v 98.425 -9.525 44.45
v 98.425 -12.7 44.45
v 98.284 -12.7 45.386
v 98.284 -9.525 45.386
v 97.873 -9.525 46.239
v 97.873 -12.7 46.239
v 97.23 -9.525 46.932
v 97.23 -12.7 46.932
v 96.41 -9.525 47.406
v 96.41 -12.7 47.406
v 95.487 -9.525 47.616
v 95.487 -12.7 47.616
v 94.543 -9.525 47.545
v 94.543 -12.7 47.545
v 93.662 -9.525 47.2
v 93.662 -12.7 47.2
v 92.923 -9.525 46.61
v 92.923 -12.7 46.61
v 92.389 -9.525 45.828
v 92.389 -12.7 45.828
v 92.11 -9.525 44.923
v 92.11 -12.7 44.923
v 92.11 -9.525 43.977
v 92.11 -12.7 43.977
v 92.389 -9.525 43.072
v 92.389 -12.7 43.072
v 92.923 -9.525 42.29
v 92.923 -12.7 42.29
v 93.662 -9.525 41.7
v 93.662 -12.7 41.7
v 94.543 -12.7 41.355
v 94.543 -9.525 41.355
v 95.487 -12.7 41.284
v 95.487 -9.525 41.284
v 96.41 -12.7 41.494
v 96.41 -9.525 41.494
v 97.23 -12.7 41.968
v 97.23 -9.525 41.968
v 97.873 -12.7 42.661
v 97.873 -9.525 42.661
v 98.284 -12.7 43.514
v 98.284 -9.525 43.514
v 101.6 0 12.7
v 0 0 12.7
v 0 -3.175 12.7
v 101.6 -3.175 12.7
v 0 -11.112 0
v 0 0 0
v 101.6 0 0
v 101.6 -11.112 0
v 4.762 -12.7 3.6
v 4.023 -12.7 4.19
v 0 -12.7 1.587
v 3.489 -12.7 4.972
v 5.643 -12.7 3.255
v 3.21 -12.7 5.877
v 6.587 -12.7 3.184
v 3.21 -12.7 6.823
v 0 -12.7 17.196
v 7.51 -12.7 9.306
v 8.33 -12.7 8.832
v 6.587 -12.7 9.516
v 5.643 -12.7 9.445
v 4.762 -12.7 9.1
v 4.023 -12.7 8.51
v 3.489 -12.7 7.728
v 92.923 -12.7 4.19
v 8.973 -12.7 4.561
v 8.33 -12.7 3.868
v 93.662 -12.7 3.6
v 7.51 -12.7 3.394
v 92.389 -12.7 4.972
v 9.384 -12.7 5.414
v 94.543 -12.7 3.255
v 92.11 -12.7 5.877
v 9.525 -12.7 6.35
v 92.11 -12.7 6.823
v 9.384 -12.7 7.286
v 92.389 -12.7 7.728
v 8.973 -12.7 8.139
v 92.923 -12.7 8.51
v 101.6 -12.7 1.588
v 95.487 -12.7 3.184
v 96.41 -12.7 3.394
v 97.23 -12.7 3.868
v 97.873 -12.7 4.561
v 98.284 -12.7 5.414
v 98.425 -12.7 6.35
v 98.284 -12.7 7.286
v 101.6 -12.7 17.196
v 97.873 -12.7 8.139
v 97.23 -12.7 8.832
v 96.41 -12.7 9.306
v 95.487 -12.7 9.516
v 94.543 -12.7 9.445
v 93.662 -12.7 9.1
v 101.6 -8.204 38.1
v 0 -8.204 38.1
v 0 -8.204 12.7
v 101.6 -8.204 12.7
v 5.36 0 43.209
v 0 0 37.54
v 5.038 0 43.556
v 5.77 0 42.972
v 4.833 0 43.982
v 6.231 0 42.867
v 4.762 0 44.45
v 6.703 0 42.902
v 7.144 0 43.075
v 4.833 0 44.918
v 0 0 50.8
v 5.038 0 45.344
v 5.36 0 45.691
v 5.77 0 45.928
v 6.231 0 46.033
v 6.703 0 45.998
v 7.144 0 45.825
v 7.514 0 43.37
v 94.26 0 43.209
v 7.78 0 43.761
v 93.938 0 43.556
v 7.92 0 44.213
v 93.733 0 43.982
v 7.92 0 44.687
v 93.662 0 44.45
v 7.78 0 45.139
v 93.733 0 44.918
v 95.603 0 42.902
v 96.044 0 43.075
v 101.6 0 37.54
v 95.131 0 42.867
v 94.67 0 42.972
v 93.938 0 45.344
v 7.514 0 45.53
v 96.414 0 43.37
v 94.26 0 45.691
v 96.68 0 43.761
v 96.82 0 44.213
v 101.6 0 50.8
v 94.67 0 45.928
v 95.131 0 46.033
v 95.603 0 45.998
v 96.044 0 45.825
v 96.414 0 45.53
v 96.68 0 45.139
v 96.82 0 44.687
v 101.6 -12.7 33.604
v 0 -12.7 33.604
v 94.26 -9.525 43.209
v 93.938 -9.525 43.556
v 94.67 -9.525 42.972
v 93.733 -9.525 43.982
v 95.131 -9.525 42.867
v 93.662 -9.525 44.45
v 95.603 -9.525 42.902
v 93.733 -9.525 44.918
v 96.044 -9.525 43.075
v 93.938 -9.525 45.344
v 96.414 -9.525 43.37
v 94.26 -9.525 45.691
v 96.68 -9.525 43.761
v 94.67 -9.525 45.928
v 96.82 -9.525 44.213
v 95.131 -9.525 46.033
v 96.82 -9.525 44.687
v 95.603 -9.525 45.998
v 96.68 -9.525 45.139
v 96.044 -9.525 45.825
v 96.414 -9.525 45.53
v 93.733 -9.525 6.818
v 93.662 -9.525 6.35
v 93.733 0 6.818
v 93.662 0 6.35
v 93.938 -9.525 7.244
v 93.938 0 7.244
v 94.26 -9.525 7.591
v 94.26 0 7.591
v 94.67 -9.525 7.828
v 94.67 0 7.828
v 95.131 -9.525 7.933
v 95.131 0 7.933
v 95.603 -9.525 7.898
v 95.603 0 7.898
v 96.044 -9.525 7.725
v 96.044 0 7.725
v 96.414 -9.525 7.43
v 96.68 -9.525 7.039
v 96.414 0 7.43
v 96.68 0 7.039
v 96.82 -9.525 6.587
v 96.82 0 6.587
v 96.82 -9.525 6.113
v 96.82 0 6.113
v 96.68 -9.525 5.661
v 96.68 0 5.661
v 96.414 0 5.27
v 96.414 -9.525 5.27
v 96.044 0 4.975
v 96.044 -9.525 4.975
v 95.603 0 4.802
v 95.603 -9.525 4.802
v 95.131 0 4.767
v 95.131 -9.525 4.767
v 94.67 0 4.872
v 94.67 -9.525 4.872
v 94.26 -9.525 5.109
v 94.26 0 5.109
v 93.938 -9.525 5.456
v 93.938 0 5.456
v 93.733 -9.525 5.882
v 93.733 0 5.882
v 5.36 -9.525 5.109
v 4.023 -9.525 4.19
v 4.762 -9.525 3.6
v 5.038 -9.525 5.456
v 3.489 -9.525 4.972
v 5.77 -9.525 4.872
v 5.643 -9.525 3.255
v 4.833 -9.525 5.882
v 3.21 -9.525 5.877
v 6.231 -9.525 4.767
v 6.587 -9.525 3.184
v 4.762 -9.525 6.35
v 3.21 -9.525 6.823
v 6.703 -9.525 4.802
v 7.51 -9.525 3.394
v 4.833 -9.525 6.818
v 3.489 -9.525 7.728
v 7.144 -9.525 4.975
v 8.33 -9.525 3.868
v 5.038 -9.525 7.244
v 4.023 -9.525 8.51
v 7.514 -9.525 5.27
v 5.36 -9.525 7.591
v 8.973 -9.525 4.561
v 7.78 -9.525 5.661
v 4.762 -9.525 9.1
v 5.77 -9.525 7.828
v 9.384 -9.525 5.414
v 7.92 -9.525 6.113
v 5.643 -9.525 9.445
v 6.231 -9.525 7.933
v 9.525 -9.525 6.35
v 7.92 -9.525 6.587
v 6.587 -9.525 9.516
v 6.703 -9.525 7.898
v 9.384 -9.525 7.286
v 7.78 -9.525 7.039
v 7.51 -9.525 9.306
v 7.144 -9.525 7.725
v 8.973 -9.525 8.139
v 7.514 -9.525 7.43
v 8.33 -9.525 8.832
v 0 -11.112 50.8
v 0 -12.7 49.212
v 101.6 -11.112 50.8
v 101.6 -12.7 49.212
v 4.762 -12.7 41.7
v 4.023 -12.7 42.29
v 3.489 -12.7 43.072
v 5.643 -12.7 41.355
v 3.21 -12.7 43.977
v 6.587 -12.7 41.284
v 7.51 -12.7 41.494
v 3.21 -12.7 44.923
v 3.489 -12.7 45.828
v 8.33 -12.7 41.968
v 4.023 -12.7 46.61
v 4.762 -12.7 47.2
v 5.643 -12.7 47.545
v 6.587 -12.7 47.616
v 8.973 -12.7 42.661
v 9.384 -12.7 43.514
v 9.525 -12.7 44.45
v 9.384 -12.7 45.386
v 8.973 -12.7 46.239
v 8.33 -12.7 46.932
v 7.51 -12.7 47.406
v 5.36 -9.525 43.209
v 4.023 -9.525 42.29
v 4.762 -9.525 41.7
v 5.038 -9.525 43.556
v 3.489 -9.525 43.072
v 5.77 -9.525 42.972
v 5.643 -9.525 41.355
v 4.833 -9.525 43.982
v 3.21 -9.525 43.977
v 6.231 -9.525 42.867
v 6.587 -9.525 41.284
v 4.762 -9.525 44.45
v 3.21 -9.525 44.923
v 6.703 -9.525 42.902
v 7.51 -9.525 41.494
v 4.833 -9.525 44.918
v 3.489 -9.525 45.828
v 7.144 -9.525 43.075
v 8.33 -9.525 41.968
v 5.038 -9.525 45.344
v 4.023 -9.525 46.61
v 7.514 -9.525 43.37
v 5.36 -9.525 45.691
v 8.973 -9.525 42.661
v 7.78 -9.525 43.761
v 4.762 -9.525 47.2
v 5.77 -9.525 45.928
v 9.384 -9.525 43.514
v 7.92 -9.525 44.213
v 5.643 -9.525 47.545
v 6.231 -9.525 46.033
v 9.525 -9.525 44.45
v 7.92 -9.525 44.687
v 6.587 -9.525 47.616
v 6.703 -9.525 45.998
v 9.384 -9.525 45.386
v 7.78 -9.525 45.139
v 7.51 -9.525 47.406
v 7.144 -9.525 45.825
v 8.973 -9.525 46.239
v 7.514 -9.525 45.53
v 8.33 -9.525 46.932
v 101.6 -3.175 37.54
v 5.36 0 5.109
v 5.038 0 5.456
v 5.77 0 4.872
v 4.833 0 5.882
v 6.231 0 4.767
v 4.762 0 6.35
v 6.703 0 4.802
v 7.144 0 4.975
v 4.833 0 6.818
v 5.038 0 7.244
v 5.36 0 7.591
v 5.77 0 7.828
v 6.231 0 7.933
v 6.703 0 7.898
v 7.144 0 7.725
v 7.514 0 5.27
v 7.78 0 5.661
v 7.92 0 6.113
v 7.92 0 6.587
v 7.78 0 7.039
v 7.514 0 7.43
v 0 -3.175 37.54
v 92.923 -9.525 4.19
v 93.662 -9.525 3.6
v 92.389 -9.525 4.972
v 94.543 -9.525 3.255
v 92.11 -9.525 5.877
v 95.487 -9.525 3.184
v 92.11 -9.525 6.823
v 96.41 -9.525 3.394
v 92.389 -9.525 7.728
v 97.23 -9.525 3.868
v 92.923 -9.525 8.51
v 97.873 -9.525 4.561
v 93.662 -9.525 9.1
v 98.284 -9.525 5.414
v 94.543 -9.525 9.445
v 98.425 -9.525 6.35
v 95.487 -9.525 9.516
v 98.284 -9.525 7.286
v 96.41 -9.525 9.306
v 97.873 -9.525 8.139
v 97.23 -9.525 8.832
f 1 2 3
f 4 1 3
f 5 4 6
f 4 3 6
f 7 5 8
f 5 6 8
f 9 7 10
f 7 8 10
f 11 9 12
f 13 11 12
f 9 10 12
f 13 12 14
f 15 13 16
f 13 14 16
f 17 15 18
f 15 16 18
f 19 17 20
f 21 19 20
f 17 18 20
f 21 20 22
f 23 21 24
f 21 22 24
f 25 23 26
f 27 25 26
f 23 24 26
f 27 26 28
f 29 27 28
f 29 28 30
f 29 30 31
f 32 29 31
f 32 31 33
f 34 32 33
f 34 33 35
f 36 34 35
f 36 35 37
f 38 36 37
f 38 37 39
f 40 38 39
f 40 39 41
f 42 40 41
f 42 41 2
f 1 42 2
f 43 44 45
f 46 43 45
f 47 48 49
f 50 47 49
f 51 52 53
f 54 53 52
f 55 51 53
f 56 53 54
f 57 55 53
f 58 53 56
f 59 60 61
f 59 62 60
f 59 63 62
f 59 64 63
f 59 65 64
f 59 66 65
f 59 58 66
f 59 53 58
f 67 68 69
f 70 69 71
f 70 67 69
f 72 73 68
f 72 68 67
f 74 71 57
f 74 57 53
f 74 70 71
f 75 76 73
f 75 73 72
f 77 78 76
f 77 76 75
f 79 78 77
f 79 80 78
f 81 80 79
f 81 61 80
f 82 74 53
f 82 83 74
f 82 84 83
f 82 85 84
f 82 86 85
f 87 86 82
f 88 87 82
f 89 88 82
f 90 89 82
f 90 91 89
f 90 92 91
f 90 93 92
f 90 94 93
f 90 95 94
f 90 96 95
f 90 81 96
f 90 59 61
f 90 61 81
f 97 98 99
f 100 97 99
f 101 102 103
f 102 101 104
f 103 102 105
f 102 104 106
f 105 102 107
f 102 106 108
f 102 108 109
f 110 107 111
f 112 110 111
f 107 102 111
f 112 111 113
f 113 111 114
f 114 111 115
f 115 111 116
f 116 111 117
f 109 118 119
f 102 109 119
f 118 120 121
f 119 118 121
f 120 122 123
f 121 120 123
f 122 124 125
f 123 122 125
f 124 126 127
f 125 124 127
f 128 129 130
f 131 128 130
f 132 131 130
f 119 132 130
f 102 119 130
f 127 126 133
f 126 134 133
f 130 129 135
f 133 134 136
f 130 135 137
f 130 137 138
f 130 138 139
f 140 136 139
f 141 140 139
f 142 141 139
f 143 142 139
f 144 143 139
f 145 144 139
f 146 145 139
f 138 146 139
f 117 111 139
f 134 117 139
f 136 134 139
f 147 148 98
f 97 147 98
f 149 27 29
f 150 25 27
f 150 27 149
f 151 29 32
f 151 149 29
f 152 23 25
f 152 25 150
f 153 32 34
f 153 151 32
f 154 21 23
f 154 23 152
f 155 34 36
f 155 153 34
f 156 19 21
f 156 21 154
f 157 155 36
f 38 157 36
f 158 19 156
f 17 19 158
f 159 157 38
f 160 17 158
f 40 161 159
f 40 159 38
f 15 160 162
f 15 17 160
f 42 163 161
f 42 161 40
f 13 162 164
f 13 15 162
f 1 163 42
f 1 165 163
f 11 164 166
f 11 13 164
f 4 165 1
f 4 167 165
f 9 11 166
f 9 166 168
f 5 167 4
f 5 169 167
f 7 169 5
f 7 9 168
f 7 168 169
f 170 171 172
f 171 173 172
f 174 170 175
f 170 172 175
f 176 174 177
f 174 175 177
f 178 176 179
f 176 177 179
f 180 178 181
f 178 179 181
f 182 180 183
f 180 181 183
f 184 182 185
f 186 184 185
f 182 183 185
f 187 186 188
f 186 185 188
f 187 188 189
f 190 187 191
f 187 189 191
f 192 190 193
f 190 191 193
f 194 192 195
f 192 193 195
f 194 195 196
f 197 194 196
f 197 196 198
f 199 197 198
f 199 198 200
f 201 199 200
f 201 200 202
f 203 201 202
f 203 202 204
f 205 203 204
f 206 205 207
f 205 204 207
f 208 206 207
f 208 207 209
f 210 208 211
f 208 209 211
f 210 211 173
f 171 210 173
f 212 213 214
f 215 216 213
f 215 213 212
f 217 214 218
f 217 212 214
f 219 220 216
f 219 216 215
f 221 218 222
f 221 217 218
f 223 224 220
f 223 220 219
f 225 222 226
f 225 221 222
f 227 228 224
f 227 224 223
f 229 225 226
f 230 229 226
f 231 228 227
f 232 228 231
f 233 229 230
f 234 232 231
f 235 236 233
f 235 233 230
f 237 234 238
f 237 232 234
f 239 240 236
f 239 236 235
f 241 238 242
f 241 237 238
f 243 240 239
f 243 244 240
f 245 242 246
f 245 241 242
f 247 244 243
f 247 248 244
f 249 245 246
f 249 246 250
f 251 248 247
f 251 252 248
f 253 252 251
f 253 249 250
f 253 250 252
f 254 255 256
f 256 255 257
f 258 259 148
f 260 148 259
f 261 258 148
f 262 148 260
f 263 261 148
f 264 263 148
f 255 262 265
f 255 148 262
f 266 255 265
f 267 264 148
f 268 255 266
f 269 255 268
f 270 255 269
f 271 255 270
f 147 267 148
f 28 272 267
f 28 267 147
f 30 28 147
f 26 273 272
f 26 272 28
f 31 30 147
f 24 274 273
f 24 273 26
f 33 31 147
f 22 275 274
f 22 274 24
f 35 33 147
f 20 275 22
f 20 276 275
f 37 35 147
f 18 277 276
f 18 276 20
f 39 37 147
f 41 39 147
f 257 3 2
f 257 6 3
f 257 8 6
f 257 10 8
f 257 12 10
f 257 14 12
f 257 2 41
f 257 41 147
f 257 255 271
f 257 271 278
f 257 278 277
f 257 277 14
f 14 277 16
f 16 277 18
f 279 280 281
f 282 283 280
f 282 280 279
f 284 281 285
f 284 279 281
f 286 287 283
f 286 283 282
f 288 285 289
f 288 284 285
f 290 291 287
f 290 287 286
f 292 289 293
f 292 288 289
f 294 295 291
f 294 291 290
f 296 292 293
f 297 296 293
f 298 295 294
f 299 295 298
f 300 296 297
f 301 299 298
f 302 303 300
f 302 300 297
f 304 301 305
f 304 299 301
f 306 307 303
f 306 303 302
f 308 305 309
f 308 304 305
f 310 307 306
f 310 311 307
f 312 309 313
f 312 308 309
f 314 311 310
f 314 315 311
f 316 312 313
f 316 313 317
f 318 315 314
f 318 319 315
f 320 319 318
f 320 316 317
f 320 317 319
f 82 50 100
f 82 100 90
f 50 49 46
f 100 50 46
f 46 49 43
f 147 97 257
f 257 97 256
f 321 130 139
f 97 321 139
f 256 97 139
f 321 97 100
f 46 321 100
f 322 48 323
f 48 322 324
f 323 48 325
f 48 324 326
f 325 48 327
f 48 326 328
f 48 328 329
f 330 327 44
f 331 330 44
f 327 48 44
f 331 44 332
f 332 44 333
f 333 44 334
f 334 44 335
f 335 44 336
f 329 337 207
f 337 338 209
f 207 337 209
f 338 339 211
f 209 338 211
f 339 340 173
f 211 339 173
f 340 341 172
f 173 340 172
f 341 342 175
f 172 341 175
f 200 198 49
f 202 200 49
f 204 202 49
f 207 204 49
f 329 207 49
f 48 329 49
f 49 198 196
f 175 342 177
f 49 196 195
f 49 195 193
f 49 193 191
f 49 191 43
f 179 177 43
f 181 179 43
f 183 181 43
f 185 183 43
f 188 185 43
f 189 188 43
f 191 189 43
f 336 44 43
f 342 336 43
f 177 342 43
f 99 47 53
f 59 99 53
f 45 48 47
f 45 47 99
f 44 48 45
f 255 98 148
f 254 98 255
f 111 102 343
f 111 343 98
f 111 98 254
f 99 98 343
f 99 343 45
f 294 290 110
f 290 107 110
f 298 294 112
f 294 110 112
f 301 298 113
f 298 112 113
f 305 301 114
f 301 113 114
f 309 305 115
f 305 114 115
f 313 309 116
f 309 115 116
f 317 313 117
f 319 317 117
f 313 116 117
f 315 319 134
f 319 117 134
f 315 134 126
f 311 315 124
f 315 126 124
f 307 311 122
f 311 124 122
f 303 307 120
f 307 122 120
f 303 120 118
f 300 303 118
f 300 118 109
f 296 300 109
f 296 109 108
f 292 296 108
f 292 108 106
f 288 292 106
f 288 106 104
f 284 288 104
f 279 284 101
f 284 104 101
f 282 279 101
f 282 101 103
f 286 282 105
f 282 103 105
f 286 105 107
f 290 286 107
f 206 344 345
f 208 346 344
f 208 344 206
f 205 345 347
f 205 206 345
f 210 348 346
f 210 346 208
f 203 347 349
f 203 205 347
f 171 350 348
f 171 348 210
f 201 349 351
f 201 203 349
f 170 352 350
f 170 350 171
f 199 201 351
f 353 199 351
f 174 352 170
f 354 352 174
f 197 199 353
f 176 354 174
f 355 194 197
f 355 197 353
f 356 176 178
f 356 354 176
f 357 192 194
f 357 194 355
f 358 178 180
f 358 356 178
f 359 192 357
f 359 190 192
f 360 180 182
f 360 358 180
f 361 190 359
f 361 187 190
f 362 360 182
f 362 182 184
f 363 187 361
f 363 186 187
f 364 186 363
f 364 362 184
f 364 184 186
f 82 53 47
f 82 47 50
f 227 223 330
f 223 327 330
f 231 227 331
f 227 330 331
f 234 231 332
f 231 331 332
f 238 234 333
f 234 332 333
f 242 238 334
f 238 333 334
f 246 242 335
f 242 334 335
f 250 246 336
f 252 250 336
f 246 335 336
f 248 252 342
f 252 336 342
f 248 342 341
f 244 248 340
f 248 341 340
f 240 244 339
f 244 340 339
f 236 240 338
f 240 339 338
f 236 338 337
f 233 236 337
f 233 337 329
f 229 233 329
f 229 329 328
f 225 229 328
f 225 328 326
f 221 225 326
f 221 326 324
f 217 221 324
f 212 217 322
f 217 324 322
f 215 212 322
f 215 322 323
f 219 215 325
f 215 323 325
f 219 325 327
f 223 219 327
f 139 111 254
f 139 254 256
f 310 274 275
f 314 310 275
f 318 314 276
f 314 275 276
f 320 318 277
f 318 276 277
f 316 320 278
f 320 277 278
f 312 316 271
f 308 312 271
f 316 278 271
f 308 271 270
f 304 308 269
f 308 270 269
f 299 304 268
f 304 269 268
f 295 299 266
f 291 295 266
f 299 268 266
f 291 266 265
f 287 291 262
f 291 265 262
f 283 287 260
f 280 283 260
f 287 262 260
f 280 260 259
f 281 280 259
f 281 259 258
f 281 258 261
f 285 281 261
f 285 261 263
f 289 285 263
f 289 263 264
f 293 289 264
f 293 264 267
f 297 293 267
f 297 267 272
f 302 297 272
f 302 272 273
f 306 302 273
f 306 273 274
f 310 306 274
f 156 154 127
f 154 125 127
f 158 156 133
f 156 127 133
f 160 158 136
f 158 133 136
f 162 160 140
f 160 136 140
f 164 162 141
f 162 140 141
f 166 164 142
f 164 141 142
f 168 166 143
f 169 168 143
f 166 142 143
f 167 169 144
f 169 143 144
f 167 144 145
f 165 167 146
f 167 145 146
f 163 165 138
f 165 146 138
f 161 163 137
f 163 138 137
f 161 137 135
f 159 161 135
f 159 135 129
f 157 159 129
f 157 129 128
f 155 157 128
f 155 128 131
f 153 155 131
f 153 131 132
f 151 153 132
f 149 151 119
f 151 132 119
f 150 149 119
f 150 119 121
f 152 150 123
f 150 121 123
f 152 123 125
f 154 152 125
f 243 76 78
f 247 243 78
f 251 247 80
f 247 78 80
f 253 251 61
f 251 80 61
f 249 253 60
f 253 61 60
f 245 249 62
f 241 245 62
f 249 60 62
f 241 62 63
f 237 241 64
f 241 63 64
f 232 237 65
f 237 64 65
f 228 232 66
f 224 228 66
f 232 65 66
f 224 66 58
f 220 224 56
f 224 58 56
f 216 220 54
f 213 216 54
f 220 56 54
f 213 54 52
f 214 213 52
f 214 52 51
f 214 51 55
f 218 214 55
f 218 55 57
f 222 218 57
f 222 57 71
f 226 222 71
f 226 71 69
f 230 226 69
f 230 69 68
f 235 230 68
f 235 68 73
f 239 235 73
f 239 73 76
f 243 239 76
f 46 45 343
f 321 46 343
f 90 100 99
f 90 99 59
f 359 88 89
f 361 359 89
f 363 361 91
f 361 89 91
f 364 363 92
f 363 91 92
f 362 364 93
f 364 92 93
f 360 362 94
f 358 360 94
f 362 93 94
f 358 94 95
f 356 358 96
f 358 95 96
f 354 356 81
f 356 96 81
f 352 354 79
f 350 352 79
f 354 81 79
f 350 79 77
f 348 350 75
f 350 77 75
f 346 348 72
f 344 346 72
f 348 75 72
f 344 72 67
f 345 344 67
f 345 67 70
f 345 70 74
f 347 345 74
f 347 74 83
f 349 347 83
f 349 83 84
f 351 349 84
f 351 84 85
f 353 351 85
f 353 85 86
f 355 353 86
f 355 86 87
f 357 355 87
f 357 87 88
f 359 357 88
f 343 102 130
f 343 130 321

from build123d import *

# Parameters (mm, degrees)
F0_W           = 101.6
F0_H           = 50.8
F1_DEPTH       = 12.7
F2_SIZE        = 1.5875
F4_D           = 3.175
F4_CBORE_D     = 6.35
F4_CBORE_DEPTH = 3.175
F6_DEPTH       = 101.601
F7_W           = 3.175
F7_H           = 24.839708
F8_DEPTH       = 101.6


with BuildPart() as f1:
    # F0 (on Front) → F1 (new body)
    with BuildSketch(Plane.XZ):
        with Locations((50.8, 25.4)):
            Rectangle(F0_W, F0_H)
    extrude(amount=F1_DEPTH)

    # F2
    f2_edges = [f1.edges().sort_by_distance(p)[0] for p in [
        (50.8, -12.7, 50.8),
        (50.8, -12.7, 0),
    ]]
    chamfer(f2_edges, length=F2_SIZE)

    # F4 (through all)
    with Locations(Plane.XZ.offset(12.7)):
        with Locations((6.35, 6.35), (6.35, 44.45), (95.25, 44.45), (95.25, 6.35)):
            CounterBoreHole(F4_D / 2, F4_CBORE_D / 2, F4_CBORE_DEPTH)

    # F5 (on face) → F6 (cut, through all)
    with BuildSketch(Plane(origin=(0, 0, 0), x_dir=(0, -1, 0), z_dir=(-1, 0, 0))):
        Polygon((12.7, 17.1958), (12.7, 33.6042), (8.2042, 38.1), (8.2042, 12.7), align=None)
    extrude(amount=-F6_DEPTH, mode=Mode.SUBTRACT)

    # F7 (on face) → F8 (cut, through all)
    with BuildSketch(Plane(origin=(0, 0, 0), x_dir=(0, -1, 0), z_dir=(-1, 0, 0))):
        with Locations((1.5875, 25.119854)):
            Rectangle(F7_W, F7_H)
    extrude(amount=-F8_DEPTH, mode=Mode.SUBTRACT)


solid = f1.part
